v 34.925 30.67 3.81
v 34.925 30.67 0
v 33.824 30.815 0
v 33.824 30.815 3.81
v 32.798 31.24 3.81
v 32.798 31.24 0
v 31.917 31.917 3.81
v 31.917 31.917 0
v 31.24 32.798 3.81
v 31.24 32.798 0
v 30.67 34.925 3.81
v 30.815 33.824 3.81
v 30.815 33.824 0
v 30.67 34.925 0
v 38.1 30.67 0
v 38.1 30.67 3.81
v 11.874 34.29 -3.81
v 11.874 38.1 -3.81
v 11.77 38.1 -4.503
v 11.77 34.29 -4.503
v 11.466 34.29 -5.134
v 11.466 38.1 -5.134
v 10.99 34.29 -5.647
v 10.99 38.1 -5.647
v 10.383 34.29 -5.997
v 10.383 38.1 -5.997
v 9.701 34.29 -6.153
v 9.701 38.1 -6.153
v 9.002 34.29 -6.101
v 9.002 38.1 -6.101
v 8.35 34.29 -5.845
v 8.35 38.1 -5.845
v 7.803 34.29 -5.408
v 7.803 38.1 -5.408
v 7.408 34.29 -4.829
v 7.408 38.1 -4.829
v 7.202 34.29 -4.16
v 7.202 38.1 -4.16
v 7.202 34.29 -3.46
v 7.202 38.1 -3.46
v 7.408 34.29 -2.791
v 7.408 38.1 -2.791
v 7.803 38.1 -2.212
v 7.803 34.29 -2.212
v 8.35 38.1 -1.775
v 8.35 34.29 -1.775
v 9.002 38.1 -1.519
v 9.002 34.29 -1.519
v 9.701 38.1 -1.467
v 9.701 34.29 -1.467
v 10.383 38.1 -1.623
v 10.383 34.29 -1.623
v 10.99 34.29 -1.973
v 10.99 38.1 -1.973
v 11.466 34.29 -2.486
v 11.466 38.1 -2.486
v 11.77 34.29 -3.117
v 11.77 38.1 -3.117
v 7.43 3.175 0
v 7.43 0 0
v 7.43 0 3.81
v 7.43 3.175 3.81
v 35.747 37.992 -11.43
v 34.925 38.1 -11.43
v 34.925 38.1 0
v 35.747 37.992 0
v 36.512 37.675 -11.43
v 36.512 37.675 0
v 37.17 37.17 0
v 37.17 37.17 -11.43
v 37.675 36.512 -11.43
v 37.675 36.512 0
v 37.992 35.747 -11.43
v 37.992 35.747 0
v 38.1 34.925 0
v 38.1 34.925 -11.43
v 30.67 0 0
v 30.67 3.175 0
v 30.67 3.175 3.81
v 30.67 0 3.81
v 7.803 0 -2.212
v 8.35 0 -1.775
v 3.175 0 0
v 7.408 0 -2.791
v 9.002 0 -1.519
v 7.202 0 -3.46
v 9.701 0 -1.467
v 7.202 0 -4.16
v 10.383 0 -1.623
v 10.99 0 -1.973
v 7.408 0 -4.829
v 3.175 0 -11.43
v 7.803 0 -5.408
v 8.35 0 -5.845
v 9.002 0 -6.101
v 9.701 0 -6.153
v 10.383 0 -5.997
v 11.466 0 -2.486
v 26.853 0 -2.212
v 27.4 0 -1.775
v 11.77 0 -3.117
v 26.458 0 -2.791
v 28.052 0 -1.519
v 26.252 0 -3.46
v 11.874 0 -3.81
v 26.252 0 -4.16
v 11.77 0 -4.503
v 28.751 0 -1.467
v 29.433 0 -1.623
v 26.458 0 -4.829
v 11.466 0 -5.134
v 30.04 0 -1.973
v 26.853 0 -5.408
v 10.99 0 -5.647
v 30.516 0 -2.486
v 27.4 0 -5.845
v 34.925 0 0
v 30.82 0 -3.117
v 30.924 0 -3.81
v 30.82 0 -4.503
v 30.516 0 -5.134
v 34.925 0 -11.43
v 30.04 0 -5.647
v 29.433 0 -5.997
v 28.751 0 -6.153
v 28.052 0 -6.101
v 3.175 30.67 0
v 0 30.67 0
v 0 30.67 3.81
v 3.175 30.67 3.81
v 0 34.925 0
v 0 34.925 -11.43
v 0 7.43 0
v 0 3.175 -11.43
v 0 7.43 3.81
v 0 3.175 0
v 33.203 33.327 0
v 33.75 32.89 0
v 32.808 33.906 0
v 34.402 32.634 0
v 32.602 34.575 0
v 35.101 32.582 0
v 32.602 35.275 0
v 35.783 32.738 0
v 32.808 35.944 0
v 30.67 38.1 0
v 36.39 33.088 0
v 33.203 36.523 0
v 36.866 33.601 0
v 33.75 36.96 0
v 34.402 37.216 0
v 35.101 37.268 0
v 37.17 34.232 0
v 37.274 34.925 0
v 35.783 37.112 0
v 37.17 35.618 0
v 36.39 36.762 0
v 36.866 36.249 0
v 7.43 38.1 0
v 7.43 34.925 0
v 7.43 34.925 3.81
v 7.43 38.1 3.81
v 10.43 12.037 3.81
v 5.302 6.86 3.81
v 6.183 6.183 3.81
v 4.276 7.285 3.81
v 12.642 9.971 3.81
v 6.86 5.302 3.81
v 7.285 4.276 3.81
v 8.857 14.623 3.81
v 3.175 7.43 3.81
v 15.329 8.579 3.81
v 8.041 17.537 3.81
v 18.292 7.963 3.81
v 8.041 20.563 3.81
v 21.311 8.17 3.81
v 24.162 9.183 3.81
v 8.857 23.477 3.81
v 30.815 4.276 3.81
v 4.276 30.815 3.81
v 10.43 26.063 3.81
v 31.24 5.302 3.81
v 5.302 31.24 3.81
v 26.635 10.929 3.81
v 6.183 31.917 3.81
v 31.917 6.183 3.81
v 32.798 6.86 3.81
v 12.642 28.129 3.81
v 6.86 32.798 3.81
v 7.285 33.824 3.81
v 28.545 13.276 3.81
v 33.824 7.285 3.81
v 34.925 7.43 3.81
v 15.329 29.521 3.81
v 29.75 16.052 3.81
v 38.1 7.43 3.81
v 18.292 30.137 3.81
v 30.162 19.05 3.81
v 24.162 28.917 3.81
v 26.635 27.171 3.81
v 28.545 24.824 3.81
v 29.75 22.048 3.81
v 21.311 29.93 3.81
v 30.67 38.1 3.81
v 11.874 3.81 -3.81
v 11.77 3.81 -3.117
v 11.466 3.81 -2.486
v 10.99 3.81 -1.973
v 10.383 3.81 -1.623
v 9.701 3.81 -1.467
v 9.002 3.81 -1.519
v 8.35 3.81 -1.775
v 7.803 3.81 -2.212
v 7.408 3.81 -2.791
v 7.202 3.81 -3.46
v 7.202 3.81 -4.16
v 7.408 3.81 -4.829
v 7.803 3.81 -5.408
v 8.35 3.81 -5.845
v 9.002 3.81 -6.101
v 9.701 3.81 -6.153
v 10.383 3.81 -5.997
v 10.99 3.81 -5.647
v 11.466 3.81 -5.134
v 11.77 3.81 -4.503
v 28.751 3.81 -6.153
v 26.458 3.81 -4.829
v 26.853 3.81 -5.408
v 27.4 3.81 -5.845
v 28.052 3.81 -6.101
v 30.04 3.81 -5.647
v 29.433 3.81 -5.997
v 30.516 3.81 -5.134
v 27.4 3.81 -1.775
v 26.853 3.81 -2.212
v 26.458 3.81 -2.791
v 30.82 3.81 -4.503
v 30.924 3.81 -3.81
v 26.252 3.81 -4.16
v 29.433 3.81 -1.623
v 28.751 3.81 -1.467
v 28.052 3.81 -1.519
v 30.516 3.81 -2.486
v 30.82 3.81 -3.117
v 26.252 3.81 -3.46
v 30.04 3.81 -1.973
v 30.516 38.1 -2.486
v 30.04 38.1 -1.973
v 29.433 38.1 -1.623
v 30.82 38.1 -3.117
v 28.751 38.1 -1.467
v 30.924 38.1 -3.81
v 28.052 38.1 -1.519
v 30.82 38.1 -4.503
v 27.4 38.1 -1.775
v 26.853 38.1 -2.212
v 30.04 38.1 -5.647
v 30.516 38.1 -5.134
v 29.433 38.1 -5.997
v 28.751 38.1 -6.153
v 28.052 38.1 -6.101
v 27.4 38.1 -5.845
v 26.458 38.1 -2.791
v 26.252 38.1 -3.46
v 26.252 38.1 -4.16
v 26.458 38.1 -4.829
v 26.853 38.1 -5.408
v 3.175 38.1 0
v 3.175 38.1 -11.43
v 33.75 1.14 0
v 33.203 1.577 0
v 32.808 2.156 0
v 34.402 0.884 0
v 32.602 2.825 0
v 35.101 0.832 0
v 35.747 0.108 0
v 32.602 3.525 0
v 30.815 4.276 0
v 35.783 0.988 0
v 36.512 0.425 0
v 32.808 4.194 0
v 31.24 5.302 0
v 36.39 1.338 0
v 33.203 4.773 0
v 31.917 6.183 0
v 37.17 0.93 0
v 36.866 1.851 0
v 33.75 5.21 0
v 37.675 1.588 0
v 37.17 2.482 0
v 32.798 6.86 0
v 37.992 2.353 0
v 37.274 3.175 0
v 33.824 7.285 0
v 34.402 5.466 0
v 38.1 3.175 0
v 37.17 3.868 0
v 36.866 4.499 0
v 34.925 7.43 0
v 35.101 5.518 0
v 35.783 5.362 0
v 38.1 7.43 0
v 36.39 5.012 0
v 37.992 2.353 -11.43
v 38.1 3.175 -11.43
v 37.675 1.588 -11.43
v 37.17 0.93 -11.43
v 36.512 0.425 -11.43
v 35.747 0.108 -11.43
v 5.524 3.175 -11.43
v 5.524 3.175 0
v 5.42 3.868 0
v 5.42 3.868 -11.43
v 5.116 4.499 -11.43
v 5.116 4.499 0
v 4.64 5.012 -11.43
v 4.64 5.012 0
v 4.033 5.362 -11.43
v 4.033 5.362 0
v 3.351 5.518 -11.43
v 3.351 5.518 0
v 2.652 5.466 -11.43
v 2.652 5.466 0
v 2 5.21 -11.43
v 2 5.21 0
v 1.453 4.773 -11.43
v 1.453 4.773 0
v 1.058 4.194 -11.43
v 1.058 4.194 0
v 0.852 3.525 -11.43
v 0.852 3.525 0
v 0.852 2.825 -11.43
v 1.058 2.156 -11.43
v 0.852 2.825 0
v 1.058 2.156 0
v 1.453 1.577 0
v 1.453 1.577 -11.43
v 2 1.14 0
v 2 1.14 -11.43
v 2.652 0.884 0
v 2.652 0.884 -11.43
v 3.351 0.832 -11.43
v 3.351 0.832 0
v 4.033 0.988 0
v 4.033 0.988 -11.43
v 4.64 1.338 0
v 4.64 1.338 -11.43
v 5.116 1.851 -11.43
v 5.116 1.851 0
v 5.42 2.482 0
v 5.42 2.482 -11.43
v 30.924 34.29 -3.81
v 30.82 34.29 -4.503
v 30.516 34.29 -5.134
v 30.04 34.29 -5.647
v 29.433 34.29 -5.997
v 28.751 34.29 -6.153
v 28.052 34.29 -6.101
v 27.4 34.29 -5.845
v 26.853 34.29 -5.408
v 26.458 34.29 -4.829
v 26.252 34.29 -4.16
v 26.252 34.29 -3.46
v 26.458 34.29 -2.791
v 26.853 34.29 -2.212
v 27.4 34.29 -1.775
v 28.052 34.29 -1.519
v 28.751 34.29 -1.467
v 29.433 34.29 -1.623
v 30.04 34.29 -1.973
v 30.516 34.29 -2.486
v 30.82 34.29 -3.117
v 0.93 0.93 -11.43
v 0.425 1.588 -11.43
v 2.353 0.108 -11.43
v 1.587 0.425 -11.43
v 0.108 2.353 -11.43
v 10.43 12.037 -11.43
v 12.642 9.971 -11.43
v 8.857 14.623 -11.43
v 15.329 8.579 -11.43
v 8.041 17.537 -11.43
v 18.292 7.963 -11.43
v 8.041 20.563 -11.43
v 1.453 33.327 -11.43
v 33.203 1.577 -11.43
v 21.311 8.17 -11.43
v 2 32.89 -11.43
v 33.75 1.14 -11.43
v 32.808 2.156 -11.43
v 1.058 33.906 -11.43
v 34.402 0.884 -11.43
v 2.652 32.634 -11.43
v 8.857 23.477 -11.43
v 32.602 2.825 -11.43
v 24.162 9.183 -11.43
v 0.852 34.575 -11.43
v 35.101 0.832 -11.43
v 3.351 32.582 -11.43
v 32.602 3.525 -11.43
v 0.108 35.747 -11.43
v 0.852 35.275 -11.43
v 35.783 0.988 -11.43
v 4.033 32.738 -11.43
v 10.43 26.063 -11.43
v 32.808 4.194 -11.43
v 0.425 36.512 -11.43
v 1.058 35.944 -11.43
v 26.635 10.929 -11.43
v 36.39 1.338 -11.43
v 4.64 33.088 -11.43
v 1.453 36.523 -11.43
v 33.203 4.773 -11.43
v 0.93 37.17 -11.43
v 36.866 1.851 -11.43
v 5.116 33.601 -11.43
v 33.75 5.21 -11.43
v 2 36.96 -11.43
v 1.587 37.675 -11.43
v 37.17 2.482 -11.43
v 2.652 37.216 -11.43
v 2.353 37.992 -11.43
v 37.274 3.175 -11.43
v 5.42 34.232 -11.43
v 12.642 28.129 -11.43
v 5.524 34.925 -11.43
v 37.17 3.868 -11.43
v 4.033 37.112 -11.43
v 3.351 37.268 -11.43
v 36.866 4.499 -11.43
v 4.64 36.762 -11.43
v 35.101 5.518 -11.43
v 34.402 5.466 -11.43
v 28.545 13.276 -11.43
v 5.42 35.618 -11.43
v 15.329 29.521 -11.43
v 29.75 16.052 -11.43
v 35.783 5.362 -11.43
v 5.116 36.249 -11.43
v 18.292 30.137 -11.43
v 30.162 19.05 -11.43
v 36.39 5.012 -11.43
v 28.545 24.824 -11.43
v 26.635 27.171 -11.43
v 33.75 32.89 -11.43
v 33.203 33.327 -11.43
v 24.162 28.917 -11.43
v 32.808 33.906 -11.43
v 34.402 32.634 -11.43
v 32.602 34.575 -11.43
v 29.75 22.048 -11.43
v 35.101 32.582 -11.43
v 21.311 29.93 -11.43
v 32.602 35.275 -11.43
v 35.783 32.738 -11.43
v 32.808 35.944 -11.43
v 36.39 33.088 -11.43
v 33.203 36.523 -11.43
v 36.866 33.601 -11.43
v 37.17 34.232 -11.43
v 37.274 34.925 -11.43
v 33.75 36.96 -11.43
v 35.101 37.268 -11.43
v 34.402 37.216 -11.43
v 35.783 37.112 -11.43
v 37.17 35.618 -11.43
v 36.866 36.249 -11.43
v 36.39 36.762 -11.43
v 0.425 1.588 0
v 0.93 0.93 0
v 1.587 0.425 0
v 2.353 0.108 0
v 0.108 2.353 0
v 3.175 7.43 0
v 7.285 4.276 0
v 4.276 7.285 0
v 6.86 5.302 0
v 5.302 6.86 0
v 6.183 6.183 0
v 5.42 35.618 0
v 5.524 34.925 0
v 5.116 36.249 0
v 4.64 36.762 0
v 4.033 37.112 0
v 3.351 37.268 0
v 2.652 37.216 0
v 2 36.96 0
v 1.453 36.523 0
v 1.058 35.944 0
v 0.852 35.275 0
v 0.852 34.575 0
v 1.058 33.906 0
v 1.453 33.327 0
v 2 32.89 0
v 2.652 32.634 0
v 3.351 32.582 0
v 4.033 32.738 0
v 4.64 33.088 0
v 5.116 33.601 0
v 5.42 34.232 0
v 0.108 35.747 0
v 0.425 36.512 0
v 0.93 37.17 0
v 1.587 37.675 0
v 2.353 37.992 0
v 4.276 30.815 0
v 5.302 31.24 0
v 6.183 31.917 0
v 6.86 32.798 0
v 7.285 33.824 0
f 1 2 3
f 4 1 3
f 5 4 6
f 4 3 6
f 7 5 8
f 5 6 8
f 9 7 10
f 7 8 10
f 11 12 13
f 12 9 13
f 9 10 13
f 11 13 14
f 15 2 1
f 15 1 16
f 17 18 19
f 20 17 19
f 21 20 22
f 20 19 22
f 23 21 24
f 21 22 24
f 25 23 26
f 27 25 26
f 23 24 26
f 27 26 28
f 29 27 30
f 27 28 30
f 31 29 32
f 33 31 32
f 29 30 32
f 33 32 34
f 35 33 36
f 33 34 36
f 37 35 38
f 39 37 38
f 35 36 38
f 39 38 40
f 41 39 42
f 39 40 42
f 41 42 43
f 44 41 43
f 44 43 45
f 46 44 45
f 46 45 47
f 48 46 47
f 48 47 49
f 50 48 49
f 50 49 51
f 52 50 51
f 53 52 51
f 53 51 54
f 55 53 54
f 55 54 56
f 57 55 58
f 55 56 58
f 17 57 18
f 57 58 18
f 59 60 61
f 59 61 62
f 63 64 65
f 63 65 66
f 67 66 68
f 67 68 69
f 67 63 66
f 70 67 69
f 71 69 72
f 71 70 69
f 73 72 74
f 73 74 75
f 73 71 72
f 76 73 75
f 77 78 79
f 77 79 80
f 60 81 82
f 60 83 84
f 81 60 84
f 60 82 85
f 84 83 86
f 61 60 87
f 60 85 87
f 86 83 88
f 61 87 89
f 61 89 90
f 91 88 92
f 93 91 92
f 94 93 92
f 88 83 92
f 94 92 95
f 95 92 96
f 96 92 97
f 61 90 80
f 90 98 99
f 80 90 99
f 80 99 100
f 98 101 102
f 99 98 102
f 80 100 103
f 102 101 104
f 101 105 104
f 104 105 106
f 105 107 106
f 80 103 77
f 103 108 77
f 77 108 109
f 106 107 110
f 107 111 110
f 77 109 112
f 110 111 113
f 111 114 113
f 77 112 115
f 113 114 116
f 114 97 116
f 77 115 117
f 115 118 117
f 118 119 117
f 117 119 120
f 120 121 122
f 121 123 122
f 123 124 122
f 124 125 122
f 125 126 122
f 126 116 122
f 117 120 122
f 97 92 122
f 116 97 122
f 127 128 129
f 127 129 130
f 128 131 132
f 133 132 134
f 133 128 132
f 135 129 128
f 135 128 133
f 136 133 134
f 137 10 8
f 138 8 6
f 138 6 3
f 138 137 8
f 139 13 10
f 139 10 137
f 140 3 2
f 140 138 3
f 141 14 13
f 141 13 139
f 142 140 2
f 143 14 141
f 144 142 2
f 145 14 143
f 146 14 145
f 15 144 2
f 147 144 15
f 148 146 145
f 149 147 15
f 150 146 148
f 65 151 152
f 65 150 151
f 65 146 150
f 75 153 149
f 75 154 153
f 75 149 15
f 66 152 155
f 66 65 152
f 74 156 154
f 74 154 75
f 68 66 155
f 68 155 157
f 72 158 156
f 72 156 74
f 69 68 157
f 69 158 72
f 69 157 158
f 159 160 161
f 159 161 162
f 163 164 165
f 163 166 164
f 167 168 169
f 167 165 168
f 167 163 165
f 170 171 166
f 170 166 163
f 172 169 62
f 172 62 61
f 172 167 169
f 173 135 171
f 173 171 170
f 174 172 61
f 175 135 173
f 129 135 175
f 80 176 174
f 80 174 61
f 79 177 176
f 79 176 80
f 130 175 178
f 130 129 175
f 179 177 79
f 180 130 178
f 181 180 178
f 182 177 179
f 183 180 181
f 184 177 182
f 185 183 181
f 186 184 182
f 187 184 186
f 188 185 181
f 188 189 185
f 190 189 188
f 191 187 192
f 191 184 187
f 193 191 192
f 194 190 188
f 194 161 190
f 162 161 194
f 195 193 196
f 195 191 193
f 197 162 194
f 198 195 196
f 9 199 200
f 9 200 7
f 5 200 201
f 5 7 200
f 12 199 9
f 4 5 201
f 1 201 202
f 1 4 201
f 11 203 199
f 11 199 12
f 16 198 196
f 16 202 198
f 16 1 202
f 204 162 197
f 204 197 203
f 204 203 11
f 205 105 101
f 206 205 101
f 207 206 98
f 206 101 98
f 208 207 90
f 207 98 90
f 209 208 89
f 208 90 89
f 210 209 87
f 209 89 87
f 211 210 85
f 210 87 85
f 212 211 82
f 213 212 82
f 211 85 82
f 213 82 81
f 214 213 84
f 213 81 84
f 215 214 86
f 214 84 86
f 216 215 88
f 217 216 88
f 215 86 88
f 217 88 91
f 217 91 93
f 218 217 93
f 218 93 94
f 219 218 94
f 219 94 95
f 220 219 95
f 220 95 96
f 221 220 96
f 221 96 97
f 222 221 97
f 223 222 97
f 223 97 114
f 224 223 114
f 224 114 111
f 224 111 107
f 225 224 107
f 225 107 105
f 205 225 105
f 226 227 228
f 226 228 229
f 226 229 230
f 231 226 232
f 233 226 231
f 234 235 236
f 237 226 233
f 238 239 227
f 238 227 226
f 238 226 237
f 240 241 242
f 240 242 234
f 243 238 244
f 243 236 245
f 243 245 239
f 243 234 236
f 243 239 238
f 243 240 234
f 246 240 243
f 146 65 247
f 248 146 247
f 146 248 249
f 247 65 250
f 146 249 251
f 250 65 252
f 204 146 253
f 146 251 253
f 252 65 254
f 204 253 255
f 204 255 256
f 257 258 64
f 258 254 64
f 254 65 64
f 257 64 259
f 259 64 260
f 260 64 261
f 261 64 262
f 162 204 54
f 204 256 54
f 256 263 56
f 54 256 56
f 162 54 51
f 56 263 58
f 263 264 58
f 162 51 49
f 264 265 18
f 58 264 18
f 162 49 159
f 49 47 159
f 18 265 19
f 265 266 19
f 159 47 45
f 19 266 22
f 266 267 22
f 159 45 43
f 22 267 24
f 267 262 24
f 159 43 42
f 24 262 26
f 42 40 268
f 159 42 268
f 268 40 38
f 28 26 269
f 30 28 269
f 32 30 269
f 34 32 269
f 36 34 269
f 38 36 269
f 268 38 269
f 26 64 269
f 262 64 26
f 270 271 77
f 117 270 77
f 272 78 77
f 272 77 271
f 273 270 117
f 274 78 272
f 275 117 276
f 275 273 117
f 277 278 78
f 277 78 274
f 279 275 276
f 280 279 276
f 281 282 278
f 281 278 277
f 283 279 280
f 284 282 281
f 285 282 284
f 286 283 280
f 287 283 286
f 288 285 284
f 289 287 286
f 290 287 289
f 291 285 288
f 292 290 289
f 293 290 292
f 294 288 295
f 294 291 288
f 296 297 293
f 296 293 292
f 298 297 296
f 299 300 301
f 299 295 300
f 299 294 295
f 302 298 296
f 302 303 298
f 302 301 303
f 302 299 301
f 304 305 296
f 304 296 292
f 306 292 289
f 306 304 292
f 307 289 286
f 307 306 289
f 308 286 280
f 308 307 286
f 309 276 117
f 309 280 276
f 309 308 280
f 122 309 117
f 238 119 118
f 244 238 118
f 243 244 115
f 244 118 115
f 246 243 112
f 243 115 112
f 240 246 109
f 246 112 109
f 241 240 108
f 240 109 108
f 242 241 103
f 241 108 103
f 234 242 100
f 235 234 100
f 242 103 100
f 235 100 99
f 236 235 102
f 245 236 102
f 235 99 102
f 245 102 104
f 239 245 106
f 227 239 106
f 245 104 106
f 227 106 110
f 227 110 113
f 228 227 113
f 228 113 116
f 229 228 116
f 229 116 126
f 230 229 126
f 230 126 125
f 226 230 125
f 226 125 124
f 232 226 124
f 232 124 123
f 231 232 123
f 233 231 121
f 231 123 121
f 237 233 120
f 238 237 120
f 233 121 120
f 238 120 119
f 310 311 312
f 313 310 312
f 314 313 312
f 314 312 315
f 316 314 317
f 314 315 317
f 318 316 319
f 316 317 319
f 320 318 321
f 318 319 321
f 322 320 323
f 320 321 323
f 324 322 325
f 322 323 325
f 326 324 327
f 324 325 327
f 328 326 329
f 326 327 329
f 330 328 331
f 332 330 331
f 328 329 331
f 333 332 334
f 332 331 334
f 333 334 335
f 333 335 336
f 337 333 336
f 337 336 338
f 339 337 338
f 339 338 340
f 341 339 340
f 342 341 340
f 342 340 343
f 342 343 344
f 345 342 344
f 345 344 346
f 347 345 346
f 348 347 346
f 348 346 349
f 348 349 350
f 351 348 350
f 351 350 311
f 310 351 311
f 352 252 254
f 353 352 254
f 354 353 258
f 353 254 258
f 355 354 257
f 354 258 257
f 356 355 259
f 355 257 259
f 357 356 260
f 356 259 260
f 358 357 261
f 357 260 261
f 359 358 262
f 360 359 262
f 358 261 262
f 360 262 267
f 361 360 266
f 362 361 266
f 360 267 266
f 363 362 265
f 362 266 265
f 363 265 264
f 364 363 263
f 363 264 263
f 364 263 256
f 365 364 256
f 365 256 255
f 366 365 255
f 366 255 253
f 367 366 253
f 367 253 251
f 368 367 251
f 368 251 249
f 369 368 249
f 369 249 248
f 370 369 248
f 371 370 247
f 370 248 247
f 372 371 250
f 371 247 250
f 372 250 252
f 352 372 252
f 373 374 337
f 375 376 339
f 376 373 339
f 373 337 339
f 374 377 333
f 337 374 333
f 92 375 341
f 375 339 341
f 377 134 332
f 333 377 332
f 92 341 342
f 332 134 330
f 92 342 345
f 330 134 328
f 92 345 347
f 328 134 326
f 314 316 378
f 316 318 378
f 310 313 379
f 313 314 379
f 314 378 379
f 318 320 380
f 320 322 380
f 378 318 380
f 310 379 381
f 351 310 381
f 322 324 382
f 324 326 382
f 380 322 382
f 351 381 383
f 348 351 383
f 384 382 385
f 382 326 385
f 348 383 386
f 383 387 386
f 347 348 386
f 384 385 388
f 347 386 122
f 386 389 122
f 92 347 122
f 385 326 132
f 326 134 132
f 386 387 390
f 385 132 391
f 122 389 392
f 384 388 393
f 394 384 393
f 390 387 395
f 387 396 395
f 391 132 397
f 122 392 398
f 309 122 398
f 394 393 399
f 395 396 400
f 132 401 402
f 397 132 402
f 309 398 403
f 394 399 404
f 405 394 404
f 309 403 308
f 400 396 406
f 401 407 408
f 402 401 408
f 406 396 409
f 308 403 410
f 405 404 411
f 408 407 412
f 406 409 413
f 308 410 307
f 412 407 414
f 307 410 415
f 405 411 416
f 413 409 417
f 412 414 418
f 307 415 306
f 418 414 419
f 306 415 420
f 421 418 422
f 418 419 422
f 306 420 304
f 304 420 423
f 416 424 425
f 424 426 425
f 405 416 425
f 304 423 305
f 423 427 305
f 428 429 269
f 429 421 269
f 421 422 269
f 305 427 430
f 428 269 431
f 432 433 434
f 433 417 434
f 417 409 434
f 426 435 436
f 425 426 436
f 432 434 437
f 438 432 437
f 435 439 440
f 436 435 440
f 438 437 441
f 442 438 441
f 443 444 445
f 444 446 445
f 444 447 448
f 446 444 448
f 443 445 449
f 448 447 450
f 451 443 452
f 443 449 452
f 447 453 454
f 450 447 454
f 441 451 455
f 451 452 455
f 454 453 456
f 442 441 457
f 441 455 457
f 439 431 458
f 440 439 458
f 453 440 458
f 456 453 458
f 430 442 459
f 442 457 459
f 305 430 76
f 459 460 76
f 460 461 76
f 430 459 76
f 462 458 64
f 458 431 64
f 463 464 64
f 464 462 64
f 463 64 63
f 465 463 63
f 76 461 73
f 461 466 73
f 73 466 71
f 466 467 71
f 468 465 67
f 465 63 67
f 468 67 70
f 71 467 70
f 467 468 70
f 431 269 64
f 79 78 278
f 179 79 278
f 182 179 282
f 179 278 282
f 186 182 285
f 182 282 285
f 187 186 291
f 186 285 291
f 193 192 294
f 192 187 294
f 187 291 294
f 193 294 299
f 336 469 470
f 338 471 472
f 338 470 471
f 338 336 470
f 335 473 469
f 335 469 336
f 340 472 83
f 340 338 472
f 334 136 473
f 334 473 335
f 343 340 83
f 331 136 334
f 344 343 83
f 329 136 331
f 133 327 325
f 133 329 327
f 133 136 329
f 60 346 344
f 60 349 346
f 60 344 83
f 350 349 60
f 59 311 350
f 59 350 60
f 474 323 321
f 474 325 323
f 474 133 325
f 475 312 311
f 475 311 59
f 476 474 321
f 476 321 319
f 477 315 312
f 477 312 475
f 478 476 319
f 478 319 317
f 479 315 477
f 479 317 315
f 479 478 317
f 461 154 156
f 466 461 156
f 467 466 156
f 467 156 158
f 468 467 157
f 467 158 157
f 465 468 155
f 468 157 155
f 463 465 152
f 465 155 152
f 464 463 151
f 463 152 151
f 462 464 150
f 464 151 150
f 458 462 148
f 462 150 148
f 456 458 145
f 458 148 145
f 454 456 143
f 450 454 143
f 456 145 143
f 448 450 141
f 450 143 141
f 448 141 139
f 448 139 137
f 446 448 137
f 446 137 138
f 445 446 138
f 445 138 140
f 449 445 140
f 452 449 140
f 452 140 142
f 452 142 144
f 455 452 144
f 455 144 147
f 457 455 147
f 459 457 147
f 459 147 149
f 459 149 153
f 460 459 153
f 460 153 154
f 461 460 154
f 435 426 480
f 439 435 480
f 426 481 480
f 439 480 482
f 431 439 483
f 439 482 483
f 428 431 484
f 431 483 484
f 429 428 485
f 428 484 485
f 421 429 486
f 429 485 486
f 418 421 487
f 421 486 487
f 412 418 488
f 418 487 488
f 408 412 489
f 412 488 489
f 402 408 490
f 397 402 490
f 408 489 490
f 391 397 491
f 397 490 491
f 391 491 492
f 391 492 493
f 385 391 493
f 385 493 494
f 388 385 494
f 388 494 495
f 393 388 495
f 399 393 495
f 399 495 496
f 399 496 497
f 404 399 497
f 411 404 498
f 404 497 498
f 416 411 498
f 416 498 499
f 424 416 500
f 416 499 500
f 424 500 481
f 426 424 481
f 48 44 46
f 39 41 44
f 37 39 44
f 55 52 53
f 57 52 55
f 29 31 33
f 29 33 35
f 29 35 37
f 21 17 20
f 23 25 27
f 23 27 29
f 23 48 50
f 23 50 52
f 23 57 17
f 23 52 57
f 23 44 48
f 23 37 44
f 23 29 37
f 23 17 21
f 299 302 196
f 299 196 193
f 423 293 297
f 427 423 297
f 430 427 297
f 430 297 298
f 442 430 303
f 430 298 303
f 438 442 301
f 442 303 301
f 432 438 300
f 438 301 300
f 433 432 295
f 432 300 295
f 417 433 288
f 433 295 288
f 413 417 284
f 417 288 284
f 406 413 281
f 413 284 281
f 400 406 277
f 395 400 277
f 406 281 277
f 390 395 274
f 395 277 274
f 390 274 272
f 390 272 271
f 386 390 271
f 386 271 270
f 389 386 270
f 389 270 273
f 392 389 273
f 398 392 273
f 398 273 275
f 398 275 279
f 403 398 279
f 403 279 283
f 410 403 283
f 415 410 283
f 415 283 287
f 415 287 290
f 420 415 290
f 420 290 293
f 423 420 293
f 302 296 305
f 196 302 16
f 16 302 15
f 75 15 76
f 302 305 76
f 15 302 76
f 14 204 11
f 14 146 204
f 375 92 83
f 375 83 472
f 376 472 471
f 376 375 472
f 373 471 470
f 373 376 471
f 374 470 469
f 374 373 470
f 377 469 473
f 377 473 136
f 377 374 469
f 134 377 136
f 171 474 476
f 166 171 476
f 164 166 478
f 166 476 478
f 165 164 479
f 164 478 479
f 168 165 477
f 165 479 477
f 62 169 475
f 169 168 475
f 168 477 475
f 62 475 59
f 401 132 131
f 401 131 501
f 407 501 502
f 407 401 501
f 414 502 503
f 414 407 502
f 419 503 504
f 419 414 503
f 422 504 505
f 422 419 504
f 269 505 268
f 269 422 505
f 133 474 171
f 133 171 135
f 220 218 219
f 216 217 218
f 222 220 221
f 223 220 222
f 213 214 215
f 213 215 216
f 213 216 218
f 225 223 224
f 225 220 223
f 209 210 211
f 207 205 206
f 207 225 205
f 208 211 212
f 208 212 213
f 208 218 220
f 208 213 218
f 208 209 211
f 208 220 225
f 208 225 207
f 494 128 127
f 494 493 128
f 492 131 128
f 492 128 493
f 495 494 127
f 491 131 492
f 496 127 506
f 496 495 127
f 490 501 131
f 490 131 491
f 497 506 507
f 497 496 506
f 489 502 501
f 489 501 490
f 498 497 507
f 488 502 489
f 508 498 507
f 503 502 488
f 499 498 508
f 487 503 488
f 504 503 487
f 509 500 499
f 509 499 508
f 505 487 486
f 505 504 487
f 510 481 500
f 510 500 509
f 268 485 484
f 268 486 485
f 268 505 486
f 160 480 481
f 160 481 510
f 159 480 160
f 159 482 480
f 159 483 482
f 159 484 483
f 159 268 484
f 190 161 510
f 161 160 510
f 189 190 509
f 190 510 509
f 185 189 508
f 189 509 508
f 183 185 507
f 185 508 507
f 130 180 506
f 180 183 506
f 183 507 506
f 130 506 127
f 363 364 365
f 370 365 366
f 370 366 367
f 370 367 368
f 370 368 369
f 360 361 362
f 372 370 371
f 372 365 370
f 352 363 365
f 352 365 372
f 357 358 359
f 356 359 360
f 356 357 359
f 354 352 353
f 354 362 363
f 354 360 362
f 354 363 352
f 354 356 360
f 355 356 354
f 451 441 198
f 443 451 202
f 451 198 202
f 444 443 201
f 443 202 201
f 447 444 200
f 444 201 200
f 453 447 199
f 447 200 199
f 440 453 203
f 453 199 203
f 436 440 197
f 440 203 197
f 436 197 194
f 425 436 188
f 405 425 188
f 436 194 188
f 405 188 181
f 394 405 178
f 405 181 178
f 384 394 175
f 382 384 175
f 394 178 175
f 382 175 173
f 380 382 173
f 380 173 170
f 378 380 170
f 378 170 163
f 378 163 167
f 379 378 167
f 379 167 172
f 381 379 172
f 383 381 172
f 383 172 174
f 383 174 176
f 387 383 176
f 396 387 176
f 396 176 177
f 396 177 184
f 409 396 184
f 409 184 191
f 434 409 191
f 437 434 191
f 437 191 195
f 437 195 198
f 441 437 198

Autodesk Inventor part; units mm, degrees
ref_plane "YZ Plane" through (0, 0, 0) normal (1, 0, 0) x (0, 1, 0)
ref_plane "XZ Plane" through (0, 0, 0) normal (0, 1, 0) x (-1, 0, 0)
ref_plane "XY Plane" through (0, 0, 0) normal (0, 0, 1) x (1, 0, 0)
sketch "Sketch1" plane through (0, 0, 0) normal (0, 0, 1) x (1, 0, 0)
  line L0 (0, 0) -> (38.1, 0)
  line L1 (38.1, 0) -> (38.1, 38.1)
  line L2 (38.1, 38.1) -> (0, 38.1)
  line L3 (0, 38.1) -> (0, 0)
  circle A0 centre (3.175, 34.925) radius 2.3495
  circle A1 centre (34.925, 34.925) radius 2.3495
  circle A2 centre (3.175, 3.175) radius 2.3495
  circle A3 centre (34.925, 3.175) radius 2.3495
  line L4 (0, 19.05) -> (19.05, 19.05)
  circle A4 centre (19.05, 19.05) radius 11.1125
  circle A5 centre (19.05, 19.05) radius 6.35
  line L5 (7.4295, 34.925) -> (7.4295, 38.1)
  line L6 (0, 30.6705) -> (3.175, 30.6705)
  arc A6 (3.175, 30.6705) -> (7.4295, 34.925) centre (3.175, 34.925) ccw
  line L7 (5.5245, 34.925) -> (7.4295, 34.925)
  line L8 (3.175, 7.4295) -> (0, 7.4295)
  line L9 (7.4295, 0) -> (7.4295, 3.175)
  arc A7 (7.4295, 3.175) -> (3.175, 7.4295) centre (3.175, 3.175) ccw
  line L10 (30.6705, 3.175) -> (30.6705, 0)
  line L11 (38.1, 7.4295) -> (34.925, 7.4295)
  arc A8 (34.925, 7.4295) -> (30.6705, 3.175) centre (34.925, 3.175) ccw
  line L12 (34.925, 30.6705) -> (38.1, 30.6705)
  line L13 (30.6705, 38.1) -> (30.6705, 34.925)
  arc A9 (30.6705, 34.925) -> (34.925, 30.6705) centre (34.925, 34.925) ccw
  line L14 (0, 7.4295) -> (0, 0)
  line L15 (0, 0) -> (7.4295, 0)
  line L16 (30.6705, 0) -> (38.1, 0)
  line L17 (38.1, 0) -> (38.1, 7.4295)
  line L18 (30.6705, 38.1) -> (38.1, 38.1)
  line L19 (38.1, 38.1) -> (38.1, 30.6705)
  dimension "d2" = 4.699
  dimension "d0" = 38.1
  dimension "d1" = 38.1
  dimension "d5" = 31.75
  dimension "d8" = 31.75
  dimension "d11" = 3.175
  dimension "d12" = 3.175
  dimension "d13" = 19.05
  dimension "d14" = 22.225
  dimension "d15" = 12.7
  dimension "d16" = 3.175
  dimension "d17" = 3.175
  dimension "d18" = 1.905
  dimension "d24" = 360
extrude "Extrusion1" add sketch "Sketch1" along normal blind 3.81 contours L9 A7 L8 L3 L6 A6 L5 L2 L13 A9 L12 L1 L11 A8 L10 L0
extrude "Extrusion2" add sketch "Sketch1" against normal blind 11.43 contours L3 L8 A7 L9 L0 | L9 A7 L8 L3 L6 A6 L5 L2 L13 A9 L12 L1 L11 A8 L10 L0 | L10 A8 L11 L1 L0 | L3 L2 L5 A6 L6 | L12 A9 L13 L2 L1
fillet "Fillet1" radius 3.175 4 edges at (38.1, 38.1, -5.715) (38.1, 0, -5.715) (0, 38.1, -5.715) (0, 0, -5.715)
sketch "Sketch2" plane through (7.4295, 38.1, 3.81) normal (0, 1, 0) x (1, 0, 0)
  line L0 (11.6205, 7.62) -> (21.1455, 7.62)
  line L1 (11.6205, 7.62) -> (2.0955, 7.62)
  circle A0 centre (2.0955, 7.62) radius 2.3495
  circle A1 centre (21.1455, 7.62) radius 2.3495
  line L2 (0, 0) -> (23.241, 0) projected
  line L3 (11.6205, 7.62) -> (11.6205, 0)
  point P0 (-7.4295, 3.81)
  dimension "d32" = 9.525
  dimension "d33" = 9.525
  dimension "d34" = 4.699
  dimension "d35" = 4.699
  dimension "d45" = 7.62
extrude "Extrusion3" cut sketch "Sketch2" against normal blind 3.81
sketch "Sketch3" plane through (7.4295, 0, 3.81) normal (0, -1, 0) x (1, 0, 0)
  line L0 (11.6205, -7.62) -> (21.1455, -7.62)
  line L1 (11.6205, -7.62) -> (2.0955, -7.62)
  circle A0 centre (2.0955, -7.62) radius 2.3495
  circle A1 centre (21.1455, -7.62) radius 2.3495
  line L2 (23.241, 0) -> (0, 0) projected
  line L3 (11.6205, -7.62) -> (11.6205, 0)
  point P0 (-7.4295, -3.81)
  dimension "d39" = 9.525
  dimension "d40" = 9.525
  dimension "d41" = 4.699
  dimension "d42" = 4.699
  dimension "d46" = 7.62
extrude "Extrusion4" cut sketch "Sketch3" against normal blind 3.81
thread "Thread1" size "10-32 UNF" class "2B" standard "ANSI Unified Screw Threads" full length
thread "Thread2" size "10-32 UNF" class "2B" standard "ANSI Unified Screw Threads" full length
thread "Thread3" size "10-32 UNF" class "2B" standard "ANSI Unified Screw Threads" full length
thread "Thread4" size "10-32 UNF" class "2B" standard "ANSI Unified Screw Threads" full length
equation "\"d16\" = d11"
equation "\"d17\" = d11"
properties part number "Gearbox End Plate" material "Aluminum-6061"
